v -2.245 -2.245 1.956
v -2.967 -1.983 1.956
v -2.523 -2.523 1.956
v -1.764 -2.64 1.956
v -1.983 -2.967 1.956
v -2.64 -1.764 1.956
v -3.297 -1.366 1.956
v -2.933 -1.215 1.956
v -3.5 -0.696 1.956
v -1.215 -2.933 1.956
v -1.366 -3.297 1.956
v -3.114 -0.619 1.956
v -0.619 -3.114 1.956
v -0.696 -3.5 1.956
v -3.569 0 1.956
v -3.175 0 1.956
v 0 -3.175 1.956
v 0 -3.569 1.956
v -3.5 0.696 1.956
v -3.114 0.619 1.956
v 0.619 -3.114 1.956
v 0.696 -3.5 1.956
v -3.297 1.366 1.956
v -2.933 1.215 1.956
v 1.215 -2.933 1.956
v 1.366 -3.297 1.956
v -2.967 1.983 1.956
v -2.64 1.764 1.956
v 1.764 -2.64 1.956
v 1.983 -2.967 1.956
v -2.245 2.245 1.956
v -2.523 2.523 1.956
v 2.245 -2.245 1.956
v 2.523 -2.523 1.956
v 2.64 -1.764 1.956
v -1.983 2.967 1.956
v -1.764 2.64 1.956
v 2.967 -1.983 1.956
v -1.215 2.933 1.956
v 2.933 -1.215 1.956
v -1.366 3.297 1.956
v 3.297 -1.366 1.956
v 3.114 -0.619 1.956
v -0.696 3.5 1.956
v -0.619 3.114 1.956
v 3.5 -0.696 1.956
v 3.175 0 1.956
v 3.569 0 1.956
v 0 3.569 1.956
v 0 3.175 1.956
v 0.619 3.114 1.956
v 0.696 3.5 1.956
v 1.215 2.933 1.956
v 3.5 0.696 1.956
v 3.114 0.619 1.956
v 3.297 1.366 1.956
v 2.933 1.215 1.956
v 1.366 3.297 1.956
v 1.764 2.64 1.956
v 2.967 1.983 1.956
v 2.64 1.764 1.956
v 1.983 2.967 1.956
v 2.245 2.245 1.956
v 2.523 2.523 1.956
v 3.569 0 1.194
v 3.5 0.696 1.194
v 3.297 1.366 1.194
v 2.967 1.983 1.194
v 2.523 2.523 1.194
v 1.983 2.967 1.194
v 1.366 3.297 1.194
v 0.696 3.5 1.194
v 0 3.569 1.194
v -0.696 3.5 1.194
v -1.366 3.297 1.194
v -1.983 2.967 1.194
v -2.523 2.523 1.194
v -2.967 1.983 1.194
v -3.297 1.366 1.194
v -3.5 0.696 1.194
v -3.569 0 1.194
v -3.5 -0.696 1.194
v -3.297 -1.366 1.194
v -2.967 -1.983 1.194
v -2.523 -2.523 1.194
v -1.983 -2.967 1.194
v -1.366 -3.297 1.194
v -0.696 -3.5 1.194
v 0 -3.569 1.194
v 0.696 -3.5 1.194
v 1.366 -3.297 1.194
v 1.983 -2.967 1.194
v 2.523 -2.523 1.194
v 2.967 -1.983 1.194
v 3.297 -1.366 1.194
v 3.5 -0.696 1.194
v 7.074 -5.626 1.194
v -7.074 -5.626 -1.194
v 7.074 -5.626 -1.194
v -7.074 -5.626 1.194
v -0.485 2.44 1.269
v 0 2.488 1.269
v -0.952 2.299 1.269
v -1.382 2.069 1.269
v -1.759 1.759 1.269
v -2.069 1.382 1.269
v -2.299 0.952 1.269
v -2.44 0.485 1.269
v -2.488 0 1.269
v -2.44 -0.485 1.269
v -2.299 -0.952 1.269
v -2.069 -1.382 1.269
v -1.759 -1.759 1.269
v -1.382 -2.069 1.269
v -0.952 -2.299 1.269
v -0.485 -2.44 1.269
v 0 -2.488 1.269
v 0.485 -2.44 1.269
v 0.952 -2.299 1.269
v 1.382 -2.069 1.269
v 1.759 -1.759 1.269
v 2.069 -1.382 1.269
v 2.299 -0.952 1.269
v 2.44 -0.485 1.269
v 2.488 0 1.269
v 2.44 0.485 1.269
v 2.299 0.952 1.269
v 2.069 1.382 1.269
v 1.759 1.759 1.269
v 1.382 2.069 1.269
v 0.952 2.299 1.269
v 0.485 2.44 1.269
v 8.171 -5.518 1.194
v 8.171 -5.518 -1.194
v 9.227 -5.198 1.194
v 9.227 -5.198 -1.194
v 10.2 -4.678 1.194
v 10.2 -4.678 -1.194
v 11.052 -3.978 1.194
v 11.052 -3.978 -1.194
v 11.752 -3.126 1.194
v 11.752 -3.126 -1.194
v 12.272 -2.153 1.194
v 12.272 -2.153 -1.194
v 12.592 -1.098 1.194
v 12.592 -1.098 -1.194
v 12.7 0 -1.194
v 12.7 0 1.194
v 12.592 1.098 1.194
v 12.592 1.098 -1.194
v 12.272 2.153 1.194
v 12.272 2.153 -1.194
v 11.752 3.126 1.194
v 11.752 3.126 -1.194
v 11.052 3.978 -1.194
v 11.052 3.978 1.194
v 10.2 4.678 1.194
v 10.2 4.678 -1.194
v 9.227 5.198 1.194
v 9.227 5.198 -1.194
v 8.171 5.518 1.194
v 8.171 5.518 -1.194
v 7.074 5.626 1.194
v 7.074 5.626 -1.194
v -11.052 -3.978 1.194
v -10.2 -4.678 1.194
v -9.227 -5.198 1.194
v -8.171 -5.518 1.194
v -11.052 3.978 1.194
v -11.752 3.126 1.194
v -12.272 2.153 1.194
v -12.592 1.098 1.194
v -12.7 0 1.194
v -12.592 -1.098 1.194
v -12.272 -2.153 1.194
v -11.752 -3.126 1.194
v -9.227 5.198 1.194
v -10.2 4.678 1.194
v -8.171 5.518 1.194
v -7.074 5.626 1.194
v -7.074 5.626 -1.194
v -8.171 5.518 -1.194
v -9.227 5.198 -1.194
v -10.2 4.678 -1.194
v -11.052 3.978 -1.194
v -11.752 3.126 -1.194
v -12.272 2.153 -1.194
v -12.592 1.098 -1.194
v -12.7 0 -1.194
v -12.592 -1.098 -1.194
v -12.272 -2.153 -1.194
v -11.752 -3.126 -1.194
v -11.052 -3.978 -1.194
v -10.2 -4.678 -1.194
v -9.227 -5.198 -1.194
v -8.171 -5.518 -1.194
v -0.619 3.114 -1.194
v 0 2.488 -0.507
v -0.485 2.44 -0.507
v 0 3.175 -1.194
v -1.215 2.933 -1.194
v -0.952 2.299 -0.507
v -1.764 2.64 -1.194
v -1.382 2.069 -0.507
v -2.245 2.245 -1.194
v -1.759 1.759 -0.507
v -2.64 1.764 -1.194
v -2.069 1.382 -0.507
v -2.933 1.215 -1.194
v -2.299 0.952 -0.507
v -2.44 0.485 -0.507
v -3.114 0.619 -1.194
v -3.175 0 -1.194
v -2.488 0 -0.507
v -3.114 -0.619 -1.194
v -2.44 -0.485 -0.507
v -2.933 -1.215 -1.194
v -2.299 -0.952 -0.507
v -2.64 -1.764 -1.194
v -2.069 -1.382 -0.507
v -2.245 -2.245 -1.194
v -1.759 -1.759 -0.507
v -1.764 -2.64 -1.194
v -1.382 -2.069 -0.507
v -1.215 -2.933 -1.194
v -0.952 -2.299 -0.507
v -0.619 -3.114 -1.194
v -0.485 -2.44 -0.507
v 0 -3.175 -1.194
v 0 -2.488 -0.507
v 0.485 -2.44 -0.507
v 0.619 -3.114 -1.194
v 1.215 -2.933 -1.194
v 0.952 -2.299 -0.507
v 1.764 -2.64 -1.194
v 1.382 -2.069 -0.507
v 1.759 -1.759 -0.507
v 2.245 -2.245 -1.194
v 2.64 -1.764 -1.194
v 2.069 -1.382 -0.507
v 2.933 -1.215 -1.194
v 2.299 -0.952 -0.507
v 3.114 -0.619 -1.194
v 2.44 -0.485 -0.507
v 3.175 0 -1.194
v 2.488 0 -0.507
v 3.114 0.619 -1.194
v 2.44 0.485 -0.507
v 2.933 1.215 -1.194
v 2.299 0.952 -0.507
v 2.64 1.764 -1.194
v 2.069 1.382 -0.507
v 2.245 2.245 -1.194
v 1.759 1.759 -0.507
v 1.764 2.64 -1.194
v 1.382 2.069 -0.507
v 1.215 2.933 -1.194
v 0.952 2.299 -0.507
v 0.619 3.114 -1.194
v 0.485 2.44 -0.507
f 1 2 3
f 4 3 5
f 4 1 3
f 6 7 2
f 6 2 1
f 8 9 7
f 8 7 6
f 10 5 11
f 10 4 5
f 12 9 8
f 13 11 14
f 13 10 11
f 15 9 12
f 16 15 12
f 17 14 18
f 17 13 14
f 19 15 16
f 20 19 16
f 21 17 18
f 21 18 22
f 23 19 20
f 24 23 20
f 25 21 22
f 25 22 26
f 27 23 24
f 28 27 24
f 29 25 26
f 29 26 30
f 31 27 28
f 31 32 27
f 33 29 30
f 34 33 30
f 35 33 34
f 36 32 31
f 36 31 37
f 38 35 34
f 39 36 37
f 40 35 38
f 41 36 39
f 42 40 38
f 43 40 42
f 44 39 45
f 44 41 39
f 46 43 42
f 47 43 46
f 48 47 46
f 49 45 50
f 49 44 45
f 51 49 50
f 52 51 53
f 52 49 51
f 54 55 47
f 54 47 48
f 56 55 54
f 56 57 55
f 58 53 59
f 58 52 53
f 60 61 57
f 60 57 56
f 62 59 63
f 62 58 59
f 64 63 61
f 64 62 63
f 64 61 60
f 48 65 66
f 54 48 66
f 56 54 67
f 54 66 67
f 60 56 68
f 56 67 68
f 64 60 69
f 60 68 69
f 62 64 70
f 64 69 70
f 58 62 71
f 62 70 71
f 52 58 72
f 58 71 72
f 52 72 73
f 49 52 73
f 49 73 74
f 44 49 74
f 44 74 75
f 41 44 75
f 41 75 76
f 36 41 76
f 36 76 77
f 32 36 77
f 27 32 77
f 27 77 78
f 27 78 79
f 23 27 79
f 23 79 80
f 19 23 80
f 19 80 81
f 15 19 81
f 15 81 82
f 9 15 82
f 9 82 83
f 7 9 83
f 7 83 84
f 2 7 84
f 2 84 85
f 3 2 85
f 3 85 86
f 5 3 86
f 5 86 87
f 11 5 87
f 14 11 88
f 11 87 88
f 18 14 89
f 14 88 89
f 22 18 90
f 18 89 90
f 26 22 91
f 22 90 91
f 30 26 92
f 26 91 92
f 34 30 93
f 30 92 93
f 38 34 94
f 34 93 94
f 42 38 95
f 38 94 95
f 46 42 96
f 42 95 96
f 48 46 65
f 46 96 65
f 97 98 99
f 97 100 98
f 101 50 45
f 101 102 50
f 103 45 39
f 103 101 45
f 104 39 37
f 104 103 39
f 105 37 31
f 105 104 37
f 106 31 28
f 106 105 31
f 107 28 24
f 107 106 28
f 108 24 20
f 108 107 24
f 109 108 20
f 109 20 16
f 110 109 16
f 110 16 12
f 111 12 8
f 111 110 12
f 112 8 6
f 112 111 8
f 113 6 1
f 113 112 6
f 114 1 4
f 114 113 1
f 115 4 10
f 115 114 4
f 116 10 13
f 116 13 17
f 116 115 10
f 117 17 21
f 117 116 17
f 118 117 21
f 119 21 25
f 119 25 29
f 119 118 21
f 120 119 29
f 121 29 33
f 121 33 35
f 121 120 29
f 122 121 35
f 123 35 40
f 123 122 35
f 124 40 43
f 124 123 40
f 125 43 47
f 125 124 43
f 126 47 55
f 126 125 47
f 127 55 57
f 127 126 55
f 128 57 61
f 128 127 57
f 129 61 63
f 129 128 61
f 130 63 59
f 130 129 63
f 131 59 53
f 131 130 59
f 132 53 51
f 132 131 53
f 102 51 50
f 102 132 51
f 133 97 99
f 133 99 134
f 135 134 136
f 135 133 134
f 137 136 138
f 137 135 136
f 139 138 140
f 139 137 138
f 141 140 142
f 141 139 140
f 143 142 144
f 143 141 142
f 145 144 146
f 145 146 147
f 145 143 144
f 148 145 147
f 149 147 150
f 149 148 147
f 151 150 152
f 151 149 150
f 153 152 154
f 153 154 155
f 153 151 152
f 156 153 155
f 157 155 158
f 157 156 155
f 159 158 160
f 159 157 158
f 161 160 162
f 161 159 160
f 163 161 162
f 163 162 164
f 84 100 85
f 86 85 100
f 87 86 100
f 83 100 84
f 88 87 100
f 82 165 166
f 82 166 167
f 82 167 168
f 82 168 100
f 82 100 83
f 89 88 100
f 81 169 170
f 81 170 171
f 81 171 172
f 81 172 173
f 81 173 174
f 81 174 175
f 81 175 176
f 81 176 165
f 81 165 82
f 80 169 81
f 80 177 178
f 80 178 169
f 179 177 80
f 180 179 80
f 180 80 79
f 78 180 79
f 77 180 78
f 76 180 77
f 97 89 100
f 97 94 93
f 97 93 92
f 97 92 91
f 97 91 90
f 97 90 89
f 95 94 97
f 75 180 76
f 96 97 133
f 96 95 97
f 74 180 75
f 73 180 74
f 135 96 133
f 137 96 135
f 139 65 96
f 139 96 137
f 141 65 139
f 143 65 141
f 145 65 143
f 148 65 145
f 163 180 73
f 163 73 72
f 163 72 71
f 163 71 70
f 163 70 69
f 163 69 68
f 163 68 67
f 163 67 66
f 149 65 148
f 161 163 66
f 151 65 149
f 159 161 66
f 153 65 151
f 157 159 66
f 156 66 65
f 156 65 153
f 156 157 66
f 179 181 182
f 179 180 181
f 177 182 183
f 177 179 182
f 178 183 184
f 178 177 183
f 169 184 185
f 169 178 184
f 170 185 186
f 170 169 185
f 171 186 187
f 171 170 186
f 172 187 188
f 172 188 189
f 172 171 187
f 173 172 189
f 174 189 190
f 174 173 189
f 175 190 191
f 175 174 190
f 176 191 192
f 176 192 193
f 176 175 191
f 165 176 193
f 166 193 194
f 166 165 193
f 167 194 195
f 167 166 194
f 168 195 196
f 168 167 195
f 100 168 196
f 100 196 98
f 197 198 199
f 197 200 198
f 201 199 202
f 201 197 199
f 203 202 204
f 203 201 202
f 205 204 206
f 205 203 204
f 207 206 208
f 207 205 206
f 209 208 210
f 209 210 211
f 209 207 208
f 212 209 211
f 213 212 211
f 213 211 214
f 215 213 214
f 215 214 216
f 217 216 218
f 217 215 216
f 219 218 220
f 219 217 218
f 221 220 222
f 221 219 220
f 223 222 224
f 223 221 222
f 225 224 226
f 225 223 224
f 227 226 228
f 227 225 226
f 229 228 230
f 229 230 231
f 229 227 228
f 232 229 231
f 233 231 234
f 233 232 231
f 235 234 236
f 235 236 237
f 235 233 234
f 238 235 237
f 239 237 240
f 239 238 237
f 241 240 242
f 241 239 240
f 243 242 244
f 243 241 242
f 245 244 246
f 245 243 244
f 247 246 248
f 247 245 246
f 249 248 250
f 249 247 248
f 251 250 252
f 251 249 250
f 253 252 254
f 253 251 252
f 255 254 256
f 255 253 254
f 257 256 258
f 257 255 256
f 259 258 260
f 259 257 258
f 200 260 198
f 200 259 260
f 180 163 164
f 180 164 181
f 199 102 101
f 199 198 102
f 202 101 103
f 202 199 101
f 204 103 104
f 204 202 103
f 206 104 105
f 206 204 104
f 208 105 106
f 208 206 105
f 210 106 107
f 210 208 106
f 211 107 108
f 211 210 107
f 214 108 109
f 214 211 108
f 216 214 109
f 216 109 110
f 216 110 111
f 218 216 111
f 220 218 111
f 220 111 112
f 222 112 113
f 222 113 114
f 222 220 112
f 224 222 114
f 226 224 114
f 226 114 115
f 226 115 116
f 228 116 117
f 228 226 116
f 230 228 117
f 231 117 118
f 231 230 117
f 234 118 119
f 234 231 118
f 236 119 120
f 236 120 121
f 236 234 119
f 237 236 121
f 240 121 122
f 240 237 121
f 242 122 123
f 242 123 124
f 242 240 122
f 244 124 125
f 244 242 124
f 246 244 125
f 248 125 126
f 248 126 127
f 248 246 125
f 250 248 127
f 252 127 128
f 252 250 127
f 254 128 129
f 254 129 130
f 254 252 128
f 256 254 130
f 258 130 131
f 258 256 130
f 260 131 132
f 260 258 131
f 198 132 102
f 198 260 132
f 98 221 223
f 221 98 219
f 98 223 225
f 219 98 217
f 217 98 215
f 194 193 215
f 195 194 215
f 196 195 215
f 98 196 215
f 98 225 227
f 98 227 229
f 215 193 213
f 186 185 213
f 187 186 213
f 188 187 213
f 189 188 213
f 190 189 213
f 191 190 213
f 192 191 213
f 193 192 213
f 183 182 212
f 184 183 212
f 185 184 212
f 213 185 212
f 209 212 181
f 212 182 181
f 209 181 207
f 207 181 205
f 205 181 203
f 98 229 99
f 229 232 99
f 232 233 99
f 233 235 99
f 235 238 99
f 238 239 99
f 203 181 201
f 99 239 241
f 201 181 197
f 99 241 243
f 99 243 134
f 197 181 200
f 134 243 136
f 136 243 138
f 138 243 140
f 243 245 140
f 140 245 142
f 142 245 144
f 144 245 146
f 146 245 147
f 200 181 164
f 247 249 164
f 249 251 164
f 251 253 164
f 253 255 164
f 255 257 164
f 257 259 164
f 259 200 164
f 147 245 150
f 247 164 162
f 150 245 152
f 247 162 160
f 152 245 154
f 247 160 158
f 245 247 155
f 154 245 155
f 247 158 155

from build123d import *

# Parameters (mm, degrees)
BOSS_EXTRUDE1_DEPTH      = 1.1938
BOSS_EXTRUDE1_DEPTH_BACK = 1.1938
SKETCH2_R                = 3.5687
BOSS_EXTRUDE2_DEPTH      = 1.9558


with BuildPart() as part:
    # Sketch1 → Boss-Extrude1 (new, two sides: drawn at the far end of the back side and taken through both)
    with BuildSketch(Plane.XY.offset(-BOSS_EXTRUDE1_DEPTH_BACK)):
        with BuildLine():
            Line((-7.0739, -5.6261), (7.0739, -5.6261))
            ThreePointArc((7.0739, -5.6261), (12.7, 0), (7.0739, 5.6261))
            Line((7.0739, 5.6261), (-7.0739, 5.6261))
            ThreePointArc((-7.0739, 5.6261), (-12.7, 0), (-7.0739, -5.6261))
        make_face()
    extrude(amount=BOSS_EXTRUDE1_DEPTH + BOSS_EXTRUDE1_DEPTH_BACK)

    # Sketch2 → Boss-Extrude2 (add)
    with BuildSketch(Plane.XY):
        Circle(SKETCH2_R)
    extrude(amount=BOSS_EXTRUDE2_DEPTH)

    # Sketch3 → Cut-Revolve1 (revolve, cut)
    with BuildSketch(Plane(origin=(0, 0, 0), x_dir=(0, 0, -1), z_dir=(1, 0, 0))):
        Polygon((-1.9558, 0), (-1.9558, 3.175), (-1.26873, 2.48793), (0.50673, 2.48793), (1.1938, 3.175), (1.1938, 0), align=None)
    revolve(axis=Axis((0, 0, -1.1938), (0, 0, 1)), mode=Mode.SUBTRACT)


solid = part.part
